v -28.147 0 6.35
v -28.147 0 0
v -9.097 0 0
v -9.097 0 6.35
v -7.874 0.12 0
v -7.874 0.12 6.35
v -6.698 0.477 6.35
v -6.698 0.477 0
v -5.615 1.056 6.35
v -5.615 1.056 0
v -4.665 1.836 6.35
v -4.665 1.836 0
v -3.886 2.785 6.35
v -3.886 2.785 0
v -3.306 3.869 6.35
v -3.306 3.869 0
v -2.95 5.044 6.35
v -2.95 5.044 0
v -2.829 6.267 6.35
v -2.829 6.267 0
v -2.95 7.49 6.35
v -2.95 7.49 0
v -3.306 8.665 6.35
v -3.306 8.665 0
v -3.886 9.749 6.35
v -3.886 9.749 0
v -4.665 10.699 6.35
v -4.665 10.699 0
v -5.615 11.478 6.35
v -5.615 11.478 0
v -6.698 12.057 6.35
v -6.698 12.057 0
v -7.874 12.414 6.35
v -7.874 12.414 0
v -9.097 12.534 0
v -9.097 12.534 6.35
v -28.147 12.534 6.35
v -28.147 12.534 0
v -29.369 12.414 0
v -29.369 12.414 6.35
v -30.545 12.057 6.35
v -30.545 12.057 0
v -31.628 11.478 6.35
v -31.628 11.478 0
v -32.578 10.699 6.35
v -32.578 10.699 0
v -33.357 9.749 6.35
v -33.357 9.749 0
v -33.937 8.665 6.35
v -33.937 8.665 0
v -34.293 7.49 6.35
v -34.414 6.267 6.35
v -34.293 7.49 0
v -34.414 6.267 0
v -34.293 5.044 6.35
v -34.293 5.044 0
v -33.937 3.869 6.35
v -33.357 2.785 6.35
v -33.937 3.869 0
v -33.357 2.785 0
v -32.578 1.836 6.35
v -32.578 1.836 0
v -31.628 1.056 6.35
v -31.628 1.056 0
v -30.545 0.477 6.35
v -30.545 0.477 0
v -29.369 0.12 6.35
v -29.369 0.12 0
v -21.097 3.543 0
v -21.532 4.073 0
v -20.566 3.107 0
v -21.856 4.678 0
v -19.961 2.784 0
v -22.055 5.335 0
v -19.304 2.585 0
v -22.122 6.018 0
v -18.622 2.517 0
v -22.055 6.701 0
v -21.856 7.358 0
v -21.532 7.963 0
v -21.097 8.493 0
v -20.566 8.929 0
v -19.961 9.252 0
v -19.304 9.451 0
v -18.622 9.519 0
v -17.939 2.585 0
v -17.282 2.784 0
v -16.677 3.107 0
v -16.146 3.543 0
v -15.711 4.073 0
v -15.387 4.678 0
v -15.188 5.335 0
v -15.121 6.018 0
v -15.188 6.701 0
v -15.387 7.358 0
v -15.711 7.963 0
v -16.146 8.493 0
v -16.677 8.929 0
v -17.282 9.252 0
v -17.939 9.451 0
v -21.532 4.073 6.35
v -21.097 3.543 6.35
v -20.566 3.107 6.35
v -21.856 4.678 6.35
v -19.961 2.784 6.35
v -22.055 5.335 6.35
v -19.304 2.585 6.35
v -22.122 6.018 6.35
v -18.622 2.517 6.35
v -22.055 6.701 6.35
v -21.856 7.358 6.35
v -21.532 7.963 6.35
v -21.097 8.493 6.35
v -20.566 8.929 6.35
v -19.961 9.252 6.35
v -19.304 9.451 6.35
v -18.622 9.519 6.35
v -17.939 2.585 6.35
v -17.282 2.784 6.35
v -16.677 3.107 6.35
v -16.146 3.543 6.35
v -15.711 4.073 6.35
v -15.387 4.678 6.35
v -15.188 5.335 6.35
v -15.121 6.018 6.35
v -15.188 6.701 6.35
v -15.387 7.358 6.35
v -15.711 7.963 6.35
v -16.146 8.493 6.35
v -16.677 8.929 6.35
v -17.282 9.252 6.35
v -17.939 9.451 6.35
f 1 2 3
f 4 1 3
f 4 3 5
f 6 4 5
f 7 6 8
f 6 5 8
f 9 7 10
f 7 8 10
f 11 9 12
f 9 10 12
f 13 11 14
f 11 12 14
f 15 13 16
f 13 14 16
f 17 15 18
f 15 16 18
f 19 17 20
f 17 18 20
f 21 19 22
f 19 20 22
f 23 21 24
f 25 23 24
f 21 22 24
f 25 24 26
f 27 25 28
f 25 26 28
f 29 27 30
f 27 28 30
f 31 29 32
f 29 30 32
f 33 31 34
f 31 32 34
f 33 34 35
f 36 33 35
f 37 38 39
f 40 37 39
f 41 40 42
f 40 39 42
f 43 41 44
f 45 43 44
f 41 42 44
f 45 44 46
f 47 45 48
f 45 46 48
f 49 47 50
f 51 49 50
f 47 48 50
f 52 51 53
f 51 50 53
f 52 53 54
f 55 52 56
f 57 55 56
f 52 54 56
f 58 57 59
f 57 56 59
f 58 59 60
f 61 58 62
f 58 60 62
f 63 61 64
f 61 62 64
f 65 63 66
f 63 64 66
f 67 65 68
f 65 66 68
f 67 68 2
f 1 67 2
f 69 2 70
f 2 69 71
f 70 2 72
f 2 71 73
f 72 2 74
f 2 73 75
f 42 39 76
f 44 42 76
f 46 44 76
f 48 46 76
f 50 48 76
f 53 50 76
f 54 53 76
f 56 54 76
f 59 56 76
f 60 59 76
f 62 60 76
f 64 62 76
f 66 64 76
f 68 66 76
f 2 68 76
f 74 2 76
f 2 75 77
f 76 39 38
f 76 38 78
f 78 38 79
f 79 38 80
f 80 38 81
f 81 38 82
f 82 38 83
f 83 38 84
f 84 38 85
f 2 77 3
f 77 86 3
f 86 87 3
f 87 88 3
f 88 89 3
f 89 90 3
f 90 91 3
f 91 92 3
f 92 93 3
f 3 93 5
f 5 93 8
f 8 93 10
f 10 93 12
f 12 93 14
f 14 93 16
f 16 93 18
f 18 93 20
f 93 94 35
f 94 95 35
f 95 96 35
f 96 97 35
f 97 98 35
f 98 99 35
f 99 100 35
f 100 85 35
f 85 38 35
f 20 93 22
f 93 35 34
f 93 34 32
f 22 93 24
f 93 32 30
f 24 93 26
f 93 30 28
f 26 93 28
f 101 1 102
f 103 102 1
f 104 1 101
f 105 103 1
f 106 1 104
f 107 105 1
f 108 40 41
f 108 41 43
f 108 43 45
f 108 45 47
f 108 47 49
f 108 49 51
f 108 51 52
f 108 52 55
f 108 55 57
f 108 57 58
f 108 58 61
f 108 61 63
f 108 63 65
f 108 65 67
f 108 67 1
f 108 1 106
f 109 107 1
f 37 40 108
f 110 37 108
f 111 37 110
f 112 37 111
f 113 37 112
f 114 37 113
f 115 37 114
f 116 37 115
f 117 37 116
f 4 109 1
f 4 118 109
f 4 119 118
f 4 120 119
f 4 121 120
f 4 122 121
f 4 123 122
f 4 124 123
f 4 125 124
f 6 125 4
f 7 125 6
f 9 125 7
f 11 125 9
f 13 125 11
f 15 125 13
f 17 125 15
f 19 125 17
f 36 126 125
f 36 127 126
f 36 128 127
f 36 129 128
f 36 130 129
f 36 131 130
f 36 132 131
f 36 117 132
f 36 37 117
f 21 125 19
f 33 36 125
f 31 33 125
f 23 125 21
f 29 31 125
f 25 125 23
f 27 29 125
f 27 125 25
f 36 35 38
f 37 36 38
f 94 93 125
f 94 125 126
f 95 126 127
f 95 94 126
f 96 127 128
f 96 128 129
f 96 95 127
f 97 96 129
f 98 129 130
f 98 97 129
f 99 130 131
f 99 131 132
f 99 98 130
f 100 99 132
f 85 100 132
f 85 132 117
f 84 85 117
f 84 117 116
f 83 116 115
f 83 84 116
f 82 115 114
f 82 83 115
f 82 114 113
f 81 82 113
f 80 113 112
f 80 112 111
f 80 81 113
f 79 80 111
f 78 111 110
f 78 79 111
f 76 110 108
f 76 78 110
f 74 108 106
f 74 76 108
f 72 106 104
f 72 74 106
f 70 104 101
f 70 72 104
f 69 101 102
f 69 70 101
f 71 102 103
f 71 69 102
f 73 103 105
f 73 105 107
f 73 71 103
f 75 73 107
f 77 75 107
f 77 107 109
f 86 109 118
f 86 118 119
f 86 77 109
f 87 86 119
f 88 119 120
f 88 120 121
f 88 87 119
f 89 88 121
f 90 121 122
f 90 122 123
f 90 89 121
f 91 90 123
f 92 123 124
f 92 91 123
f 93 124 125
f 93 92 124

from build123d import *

# Parameters (mm, degrees)
F0_R     = 3.500564
F1_DEPTH = 6.35


with BuildPart() as f1:
    # F0 (on Top) → F1 (new body)
    with BuildSketch(Plane.XY):
        with BuildLine():
            Line((-9.096524, 12.534158), (-28.146524, 12.534158))
            ThreePointArc((-28.146524, 12.534158), (-34.413602, 6.267079), (-28.146524, 0))
            Line((-28.146524, 0), (-9.096524, 0))
            ThreePointArc((-9.096524, 0), (-2.829445, 6.267079), (-9.096524, 12.534158))
        make_face()
        with Locations((-18.621524, 6.01799)):
            Circle(F0_R, mode=Mode.SUBTRACT)
    extrude(amount=F1_DEPTH)


solid = f1.part
